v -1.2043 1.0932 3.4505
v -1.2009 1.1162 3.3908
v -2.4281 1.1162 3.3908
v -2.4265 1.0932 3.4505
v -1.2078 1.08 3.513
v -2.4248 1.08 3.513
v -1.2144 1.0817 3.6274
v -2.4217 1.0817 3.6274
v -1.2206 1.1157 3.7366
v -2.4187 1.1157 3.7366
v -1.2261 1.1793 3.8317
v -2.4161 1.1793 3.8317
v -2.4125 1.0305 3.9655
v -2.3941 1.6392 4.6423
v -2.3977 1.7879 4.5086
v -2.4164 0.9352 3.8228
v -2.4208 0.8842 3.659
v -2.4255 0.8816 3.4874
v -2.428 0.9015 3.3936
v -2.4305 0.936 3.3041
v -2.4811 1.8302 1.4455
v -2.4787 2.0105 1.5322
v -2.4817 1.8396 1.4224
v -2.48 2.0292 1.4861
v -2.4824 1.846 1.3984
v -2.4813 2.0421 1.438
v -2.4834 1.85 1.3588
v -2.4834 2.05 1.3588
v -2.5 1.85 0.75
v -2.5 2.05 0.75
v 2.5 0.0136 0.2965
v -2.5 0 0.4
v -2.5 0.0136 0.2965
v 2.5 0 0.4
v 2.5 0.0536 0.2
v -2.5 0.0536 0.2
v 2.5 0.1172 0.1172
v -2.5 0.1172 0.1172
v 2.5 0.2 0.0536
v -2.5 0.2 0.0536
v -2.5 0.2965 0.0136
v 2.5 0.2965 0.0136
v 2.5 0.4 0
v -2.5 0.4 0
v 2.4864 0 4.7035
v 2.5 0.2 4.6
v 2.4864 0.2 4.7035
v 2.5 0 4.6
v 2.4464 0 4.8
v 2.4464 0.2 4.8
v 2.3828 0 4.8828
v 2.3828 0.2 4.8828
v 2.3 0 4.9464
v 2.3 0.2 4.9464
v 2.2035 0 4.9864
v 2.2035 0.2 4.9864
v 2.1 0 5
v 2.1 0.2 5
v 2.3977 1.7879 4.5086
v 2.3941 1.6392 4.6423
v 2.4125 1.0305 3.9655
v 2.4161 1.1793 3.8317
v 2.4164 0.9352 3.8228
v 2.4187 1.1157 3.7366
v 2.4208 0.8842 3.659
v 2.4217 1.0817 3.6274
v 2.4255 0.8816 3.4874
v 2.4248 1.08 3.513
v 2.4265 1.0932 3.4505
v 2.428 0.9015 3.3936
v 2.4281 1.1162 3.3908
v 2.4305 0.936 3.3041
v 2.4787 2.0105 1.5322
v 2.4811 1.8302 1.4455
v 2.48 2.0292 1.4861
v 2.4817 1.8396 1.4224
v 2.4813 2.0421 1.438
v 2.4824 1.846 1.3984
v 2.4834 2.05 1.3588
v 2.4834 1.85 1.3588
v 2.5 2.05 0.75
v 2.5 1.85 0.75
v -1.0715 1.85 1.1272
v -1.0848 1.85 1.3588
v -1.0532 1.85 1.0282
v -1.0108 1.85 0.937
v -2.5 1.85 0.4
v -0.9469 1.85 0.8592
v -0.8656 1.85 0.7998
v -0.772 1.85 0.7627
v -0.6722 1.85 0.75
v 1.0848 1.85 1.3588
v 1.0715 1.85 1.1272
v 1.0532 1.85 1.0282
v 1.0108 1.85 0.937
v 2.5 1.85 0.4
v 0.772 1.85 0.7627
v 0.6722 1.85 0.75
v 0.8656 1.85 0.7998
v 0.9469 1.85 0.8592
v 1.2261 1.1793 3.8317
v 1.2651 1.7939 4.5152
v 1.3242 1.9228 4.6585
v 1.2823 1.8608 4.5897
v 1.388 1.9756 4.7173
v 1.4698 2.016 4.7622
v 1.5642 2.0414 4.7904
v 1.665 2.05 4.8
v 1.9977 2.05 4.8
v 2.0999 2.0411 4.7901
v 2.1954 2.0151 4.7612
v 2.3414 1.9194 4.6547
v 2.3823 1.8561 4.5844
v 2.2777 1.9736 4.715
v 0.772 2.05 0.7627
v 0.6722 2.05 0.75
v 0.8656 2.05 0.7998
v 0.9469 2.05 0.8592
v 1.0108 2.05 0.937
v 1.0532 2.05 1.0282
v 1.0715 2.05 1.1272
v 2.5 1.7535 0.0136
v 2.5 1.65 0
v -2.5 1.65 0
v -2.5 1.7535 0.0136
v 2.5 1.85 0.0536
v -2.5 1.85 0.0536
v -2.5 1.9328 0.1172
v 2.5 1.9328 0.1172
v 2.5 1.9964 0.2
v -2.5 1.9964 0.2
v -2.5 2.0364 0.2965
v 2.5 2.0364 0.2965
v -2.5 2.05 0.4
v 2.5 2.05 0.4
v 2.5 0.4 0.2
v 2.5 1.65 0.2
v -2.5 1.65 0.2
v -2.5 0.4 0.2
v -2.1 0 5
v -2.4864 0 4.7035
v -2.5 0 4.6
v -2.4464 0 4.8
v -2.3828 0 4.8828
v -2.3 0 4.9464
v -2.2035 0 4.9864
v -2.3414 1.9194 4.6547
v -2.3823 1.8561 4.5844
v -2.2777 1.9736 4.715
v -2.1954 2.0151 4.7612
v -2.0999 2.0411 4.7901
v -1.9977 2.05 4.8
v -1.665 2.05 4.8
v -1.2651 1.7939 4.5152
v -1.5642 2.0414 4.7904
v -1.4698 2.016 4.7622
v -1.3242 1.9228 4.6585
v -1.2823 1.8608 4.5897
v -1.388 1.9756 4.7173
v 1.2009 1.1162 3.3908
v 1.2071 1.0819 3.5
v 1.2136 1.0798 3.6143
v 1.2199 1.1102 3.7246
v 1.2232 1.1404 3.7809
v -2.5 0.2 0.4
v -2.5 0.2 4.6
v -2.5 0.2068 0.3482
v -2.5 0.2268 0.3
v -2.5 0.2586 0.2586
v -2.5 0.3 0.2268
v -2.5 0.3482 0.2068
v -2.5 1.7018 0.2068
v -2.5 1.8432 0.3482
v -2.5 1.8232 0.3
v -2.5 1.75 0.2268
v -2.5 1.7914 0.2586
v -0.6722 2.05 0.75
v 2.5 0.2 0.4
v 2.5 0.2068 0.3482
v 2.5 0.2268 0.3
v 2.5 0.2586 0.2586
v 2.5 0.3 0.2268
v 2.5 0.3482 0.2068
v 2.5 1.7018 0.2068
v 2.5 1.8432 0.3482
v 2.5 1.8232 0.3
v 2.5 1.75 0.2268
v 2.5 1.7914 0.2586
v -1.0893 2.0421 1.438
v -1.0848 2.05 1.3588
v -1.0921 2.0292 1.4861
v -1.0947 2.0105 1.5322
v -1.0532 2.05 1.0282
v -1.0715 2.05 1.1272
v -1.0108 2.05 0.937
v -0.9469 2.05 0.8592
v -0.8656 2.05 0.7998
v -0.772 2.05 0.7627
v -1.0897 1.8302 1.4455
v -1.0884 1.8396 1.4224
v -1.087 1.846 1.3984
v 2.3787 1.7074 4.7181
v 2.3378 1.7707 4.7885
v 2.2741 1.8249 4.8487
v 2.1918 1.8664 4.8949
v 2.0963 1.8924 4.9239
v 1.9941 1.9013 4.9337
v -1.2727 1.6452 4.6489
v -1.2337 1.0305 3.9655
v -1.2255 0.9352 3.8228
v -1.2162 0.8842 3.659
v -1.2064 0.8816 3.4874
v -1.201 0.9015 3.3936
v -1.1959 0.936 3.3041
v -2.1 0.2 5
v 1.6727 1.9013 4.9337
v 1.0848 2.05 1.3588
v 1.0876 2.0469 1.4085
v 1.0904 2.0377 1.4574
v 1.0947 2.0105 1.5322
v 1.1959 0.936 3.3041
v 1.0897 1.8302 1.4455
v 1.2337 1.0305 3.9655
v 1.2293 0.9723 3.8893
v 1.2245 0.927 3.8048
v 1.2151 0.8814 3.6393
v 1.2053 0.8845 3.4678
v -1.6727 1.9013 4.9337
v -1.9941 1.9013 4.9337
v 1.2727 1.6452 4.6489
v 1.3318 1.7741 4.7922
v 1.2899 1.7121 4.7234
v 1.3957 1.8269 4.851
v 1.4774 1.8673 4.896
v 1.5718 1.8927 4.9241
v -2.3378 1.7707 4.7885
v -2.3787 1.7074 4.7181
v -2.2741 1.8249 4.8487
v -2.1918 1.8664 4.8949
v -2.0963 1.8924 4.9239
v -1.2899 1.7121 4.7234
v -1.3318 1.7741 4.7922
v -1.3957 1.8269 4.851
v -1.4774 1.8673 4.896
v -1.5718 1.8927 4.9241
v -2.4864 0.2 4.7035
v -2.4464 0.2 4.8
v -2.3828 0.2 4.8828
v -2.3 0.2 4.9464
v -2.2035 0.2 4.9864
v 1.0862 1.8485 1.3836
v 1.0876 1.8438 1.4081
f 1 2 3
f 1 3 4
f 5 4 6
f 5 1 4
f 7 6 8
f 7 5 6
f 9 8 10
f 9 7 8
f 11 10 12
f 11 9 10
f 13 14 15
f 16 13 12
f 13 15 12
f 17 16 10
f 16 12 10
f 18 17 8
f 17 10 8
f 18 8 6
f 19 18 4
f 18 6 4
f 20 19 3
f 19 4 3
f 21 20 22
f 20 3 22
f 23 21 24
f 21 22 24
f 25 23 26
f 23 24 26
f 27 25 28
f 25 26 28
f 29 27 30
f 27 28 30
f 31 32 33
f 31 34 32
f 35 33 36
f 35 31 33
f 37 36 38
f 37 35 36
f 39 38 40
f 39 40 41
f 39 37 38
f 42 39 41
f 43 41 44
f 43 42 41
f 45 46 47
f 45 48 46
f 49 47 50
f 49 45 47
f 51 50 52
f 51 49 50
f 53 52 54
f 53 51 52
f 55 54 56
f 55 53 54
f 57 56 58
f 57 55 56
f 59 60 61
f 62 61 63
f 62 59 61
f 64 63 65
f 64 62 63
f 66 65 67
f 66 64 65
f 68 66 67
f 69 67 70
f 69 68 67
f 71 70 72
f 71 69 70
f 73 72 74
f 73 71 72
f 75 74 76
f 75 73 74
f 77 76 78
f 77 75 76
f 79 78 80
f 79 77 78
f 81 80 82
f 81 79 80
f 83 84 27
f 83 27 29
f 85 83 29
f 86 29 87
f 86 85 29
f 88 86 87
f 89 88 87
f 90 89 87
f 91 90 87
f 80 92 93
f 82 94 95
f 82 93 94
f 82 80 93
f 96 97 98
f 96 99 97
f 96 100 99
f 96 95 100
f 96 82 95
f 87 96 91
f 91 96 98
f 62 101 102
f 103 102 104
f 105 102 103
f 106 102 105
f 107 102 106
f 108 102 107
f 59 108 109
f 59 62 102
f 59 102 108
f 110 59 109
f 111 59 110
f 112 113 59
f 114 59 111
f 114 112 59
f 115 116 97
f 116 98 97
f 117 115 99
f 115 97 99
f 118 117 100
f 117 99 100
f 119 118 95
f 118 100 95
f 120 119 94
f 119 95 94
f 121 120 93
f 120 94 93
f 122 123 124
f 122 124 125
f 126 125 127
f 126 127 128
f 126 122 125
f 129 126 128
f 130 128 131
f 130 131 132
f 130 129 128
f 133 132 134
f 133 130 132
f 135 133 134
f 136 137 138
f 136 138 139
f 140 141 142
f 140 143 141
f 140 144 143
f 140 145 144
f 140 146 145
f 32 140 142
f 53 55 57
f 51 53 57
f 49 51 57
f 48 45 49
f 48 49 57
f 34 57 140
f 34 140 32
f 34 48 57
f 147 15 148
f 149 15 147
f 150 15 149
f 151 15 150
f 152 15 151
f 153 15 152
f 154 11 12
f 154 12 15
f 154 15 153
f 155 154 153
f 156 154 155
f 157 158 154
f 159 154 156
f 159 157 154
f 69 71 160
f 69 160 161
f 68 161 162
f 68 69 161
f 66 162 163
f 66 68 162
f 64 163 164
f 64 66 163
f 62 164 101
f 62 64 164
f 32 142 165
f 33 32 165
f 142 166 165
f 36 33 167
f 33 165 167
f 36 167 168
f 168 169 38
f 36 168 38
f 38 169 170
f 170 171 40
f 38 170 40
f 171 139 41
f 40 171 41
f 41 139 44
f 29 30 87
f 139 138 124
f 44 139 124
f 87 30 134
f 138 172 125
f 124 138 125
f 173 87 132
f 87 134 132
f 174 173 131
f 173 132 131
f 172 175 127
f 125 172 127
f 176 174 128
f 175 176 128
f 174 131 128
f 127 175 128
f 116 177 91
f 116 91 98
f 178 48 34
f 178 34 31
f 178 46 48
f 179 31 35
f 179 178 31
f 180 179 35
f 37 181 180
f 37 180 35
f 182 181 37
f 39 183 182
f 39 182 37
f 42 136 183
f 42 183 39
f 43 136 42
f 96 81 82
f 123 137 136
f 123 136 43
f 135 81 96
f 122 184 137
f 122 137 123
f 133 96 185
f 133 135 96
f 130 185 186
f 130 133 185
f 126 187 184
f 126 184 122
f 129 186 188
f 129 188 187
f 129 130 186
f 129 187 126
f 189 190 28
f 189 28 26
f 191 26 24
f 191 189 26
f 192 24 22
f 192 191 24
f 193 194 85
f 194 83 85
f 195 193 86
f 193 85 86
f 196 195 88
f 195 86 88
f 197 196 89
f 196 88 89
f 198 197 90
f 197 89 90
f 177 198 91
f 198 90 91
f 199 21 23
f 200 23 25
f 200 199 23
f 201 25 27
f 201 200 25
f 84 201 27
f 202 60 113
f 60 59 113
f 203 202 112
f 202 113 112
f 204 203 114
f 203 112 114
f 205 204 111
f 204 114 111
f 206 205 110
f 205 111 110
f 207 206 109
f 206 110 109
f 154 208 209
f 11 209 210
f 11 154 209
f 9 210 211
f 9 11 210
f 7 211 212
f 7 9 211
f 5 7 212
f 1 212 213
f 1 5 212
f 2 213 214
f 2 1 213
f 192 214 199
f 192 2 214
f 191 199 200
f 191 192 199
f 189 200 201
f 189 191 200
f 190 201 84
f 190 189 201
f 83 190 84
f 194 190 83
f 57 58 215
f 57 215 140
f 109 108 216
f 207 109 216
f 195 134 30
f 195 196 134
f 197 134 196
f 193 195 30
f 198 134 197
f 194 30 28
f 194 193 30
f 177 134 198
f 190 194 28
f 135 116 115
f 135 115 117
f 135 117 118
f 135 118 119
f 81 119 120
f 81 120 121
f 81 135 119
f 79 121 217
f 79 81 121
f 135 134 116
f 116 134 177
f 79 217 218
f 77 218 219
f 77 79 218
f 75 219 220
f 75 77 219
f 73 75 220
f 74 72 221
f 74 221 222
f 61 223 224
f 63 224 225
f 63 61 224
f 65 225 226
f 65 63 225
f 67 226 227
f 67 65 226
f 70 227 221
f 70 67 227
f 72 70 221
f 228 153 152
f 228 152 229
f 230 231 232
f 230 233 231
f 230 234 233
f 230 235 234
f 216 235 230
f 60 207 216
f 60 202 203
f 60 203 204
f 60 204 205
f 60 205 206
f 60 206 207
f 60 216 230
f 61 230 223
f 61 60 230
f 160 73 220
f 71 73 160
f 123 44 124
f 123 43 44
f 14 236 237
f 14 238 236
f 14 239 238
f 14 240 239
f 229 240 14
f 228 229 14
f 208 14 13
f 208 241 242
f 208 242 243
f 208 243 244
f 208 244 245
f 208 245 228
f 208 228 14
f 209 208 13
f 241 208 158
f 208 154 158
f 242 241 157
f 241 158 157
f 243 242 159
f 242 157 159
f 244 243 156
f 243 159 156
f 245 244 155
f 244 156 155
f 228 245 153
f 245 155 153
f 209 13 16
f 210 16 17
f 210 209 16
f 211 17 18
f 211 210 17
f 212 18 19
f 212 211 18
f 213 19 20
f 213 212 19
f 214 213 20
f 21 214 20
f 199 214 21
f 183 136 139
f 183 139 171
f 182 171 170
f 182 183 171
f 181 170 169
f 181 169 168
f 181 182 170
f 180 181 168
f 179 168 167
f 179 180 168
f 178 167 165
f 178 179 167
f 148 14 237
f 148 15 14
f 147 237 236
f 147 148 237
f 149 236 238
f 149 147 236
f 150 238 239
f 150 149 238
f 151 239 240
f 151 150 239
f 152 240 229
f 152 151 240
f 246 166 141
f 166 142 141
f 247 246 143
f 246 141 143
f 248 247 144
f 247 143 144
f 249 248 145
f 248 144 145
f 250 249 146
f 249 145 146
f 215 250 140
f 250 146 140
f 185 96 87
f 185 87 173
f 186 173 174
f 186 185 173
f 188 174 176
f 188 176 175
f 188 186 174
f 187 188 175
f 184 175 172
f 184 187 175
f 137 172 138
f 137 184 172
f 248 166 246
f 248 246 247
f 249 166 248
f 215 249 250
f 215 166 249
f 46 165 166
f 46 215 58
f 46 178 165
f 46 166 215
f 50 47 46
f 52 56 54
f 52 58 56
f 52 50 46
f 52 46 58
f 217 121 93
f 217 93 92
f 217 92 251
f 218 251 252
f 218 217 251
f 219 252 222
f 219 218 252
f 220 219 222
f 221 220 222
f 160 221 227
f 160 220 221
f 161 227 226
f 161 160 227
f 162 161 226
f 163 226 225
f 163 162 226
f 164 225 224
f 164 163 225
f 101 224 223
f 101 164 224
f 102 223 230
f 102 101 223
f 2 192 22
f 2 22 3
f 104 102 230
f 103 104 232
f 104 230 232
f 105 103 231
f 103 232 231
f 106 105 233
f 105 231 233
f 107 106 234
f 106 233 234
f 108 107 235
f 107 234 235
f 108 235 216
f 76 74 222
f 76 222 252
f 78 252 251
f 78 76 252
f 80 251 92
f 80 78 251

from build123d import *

# Parameters (mm, degrees)
BOSS_EXTRUDE1_DEPTH = 2.5
CUT_EXTRUDE1_DEPTH  = 1.5
FILLET1_R           = 0.4


with BuildPart() as part:
    # Sketch1 → Boss-Extrude1 (new body, symmetric)
    with BuildSketch(Plane(origin=(0, 0, 0), x_dir=(0, 0, -1), z_dir=(1, 0, 0))):
        with BuildLine():
            Line((0, 0.4), (0, 1.65))
            ThreePointArc((0, 1.65), (-0.117157288, 1.932842712), (-0.4, 2.05))
            Line((-0.4, 2.05), (-1.358780422, 2.05))
            ThreePointArc((-1.358780422, 2.05), (-1.447716686, 2.039987616), (-1.532200631, 2.010451704))
            Line((-1.532200631, 2.010451704), (-3.390846854, 1.116221457))
            ThreePointArc((-3.390846854, 1.116221457), (-3.620875047, 1.080699), (-3.831736196, 1.17925046))
            Line((-3.831736196, 1.17925046), (-4.8, 2.05))
            Line((-4.8, 2.05), (-4.933734566, 1.90128865))
            Line((-4.933734566, 1.90128865), (-3.965470763, 1.03053911))
            ThreePointArc((-3.965470763, 1.03053911), (-3.649179039, 0.88271192), (-3.30413675, 0.935995605))
            Line((-3.30413675, 0.935995605), (-1.445490526, 1.830225852))
            ThreePointArc((-1.445490526, 1.830225852), (-1.403248554, 1.844993808), (-1.358780422, 1.85))
            Line((-1.358780422, 1.85), (-0.4, 1.85))
            ThreePointArc((-0.4, 1.85), (-0.258578644, 1.791421356), (-0.2, 1.65))
            Line((-0.2, 1.65), (-0.2, 0.4))
            ThreePointArc((-0.2, 0.4), (-0.258578644, 0.258578644), (-0.4, 0.2))
            Line((-0.4, 0.2), (-5, 0.2))
            Line((-5, 0.2), (-5, 0))
            Line((-5, 0), (-0.4, 0))
            ThreePointArc((-0.4, 0), (-0.117157288, 0.117157288), (0, 0.4))
        make_face()
    extrude(amount=BOSS_EXTRUDE1_DEPTH, both=True)

    # Sketch2 → Cut-Extrude1 (cut)
    with BuildSketch(Plane(origin=(0, 2.05, 0), x_dir=(1, 0, 0), z_dir=(0, 1, 0))):
        Polygon((-1.05, -0.75), (1.05, -0.75), (1.289010448, -4.933734566), (-1.289010448, -4.933734566), align=None)
        Polygon((-2.5, -0.75), (-2.5, -4.933734566), (-2.386118968, -4.933734566), align=None)
        Polygon((2.5, -4.933734566), (2.386118968, -4.933734566), (2.5, -0.75), align=None)
    extrude(amount=-CUT_EXTRUDE1_DEPTH, mode=Mode.SUBTRACT)

    # Fillet1
    fillet1_edges = [part.edges().sort_by_distance(p)[0] for p in [
        (2.387939092, 1.975644325, 4.866867283),
        (-1.05, 1.95, 0.75),
        (1.05, 1.95, 0.75),
        (1.285190421, 1.975644325, 4.866867283),
        (-1.285190421, 1.975644325, 4.866867283),
        (-2.5, 0.1, 5),
        (2.5, 0.1, 5),
        (-2.387939092, 1.975644325, 4.866867283),
    ]]
    fillet(fillet1_edges, radius=FILLET1_R)


solid = part.part
